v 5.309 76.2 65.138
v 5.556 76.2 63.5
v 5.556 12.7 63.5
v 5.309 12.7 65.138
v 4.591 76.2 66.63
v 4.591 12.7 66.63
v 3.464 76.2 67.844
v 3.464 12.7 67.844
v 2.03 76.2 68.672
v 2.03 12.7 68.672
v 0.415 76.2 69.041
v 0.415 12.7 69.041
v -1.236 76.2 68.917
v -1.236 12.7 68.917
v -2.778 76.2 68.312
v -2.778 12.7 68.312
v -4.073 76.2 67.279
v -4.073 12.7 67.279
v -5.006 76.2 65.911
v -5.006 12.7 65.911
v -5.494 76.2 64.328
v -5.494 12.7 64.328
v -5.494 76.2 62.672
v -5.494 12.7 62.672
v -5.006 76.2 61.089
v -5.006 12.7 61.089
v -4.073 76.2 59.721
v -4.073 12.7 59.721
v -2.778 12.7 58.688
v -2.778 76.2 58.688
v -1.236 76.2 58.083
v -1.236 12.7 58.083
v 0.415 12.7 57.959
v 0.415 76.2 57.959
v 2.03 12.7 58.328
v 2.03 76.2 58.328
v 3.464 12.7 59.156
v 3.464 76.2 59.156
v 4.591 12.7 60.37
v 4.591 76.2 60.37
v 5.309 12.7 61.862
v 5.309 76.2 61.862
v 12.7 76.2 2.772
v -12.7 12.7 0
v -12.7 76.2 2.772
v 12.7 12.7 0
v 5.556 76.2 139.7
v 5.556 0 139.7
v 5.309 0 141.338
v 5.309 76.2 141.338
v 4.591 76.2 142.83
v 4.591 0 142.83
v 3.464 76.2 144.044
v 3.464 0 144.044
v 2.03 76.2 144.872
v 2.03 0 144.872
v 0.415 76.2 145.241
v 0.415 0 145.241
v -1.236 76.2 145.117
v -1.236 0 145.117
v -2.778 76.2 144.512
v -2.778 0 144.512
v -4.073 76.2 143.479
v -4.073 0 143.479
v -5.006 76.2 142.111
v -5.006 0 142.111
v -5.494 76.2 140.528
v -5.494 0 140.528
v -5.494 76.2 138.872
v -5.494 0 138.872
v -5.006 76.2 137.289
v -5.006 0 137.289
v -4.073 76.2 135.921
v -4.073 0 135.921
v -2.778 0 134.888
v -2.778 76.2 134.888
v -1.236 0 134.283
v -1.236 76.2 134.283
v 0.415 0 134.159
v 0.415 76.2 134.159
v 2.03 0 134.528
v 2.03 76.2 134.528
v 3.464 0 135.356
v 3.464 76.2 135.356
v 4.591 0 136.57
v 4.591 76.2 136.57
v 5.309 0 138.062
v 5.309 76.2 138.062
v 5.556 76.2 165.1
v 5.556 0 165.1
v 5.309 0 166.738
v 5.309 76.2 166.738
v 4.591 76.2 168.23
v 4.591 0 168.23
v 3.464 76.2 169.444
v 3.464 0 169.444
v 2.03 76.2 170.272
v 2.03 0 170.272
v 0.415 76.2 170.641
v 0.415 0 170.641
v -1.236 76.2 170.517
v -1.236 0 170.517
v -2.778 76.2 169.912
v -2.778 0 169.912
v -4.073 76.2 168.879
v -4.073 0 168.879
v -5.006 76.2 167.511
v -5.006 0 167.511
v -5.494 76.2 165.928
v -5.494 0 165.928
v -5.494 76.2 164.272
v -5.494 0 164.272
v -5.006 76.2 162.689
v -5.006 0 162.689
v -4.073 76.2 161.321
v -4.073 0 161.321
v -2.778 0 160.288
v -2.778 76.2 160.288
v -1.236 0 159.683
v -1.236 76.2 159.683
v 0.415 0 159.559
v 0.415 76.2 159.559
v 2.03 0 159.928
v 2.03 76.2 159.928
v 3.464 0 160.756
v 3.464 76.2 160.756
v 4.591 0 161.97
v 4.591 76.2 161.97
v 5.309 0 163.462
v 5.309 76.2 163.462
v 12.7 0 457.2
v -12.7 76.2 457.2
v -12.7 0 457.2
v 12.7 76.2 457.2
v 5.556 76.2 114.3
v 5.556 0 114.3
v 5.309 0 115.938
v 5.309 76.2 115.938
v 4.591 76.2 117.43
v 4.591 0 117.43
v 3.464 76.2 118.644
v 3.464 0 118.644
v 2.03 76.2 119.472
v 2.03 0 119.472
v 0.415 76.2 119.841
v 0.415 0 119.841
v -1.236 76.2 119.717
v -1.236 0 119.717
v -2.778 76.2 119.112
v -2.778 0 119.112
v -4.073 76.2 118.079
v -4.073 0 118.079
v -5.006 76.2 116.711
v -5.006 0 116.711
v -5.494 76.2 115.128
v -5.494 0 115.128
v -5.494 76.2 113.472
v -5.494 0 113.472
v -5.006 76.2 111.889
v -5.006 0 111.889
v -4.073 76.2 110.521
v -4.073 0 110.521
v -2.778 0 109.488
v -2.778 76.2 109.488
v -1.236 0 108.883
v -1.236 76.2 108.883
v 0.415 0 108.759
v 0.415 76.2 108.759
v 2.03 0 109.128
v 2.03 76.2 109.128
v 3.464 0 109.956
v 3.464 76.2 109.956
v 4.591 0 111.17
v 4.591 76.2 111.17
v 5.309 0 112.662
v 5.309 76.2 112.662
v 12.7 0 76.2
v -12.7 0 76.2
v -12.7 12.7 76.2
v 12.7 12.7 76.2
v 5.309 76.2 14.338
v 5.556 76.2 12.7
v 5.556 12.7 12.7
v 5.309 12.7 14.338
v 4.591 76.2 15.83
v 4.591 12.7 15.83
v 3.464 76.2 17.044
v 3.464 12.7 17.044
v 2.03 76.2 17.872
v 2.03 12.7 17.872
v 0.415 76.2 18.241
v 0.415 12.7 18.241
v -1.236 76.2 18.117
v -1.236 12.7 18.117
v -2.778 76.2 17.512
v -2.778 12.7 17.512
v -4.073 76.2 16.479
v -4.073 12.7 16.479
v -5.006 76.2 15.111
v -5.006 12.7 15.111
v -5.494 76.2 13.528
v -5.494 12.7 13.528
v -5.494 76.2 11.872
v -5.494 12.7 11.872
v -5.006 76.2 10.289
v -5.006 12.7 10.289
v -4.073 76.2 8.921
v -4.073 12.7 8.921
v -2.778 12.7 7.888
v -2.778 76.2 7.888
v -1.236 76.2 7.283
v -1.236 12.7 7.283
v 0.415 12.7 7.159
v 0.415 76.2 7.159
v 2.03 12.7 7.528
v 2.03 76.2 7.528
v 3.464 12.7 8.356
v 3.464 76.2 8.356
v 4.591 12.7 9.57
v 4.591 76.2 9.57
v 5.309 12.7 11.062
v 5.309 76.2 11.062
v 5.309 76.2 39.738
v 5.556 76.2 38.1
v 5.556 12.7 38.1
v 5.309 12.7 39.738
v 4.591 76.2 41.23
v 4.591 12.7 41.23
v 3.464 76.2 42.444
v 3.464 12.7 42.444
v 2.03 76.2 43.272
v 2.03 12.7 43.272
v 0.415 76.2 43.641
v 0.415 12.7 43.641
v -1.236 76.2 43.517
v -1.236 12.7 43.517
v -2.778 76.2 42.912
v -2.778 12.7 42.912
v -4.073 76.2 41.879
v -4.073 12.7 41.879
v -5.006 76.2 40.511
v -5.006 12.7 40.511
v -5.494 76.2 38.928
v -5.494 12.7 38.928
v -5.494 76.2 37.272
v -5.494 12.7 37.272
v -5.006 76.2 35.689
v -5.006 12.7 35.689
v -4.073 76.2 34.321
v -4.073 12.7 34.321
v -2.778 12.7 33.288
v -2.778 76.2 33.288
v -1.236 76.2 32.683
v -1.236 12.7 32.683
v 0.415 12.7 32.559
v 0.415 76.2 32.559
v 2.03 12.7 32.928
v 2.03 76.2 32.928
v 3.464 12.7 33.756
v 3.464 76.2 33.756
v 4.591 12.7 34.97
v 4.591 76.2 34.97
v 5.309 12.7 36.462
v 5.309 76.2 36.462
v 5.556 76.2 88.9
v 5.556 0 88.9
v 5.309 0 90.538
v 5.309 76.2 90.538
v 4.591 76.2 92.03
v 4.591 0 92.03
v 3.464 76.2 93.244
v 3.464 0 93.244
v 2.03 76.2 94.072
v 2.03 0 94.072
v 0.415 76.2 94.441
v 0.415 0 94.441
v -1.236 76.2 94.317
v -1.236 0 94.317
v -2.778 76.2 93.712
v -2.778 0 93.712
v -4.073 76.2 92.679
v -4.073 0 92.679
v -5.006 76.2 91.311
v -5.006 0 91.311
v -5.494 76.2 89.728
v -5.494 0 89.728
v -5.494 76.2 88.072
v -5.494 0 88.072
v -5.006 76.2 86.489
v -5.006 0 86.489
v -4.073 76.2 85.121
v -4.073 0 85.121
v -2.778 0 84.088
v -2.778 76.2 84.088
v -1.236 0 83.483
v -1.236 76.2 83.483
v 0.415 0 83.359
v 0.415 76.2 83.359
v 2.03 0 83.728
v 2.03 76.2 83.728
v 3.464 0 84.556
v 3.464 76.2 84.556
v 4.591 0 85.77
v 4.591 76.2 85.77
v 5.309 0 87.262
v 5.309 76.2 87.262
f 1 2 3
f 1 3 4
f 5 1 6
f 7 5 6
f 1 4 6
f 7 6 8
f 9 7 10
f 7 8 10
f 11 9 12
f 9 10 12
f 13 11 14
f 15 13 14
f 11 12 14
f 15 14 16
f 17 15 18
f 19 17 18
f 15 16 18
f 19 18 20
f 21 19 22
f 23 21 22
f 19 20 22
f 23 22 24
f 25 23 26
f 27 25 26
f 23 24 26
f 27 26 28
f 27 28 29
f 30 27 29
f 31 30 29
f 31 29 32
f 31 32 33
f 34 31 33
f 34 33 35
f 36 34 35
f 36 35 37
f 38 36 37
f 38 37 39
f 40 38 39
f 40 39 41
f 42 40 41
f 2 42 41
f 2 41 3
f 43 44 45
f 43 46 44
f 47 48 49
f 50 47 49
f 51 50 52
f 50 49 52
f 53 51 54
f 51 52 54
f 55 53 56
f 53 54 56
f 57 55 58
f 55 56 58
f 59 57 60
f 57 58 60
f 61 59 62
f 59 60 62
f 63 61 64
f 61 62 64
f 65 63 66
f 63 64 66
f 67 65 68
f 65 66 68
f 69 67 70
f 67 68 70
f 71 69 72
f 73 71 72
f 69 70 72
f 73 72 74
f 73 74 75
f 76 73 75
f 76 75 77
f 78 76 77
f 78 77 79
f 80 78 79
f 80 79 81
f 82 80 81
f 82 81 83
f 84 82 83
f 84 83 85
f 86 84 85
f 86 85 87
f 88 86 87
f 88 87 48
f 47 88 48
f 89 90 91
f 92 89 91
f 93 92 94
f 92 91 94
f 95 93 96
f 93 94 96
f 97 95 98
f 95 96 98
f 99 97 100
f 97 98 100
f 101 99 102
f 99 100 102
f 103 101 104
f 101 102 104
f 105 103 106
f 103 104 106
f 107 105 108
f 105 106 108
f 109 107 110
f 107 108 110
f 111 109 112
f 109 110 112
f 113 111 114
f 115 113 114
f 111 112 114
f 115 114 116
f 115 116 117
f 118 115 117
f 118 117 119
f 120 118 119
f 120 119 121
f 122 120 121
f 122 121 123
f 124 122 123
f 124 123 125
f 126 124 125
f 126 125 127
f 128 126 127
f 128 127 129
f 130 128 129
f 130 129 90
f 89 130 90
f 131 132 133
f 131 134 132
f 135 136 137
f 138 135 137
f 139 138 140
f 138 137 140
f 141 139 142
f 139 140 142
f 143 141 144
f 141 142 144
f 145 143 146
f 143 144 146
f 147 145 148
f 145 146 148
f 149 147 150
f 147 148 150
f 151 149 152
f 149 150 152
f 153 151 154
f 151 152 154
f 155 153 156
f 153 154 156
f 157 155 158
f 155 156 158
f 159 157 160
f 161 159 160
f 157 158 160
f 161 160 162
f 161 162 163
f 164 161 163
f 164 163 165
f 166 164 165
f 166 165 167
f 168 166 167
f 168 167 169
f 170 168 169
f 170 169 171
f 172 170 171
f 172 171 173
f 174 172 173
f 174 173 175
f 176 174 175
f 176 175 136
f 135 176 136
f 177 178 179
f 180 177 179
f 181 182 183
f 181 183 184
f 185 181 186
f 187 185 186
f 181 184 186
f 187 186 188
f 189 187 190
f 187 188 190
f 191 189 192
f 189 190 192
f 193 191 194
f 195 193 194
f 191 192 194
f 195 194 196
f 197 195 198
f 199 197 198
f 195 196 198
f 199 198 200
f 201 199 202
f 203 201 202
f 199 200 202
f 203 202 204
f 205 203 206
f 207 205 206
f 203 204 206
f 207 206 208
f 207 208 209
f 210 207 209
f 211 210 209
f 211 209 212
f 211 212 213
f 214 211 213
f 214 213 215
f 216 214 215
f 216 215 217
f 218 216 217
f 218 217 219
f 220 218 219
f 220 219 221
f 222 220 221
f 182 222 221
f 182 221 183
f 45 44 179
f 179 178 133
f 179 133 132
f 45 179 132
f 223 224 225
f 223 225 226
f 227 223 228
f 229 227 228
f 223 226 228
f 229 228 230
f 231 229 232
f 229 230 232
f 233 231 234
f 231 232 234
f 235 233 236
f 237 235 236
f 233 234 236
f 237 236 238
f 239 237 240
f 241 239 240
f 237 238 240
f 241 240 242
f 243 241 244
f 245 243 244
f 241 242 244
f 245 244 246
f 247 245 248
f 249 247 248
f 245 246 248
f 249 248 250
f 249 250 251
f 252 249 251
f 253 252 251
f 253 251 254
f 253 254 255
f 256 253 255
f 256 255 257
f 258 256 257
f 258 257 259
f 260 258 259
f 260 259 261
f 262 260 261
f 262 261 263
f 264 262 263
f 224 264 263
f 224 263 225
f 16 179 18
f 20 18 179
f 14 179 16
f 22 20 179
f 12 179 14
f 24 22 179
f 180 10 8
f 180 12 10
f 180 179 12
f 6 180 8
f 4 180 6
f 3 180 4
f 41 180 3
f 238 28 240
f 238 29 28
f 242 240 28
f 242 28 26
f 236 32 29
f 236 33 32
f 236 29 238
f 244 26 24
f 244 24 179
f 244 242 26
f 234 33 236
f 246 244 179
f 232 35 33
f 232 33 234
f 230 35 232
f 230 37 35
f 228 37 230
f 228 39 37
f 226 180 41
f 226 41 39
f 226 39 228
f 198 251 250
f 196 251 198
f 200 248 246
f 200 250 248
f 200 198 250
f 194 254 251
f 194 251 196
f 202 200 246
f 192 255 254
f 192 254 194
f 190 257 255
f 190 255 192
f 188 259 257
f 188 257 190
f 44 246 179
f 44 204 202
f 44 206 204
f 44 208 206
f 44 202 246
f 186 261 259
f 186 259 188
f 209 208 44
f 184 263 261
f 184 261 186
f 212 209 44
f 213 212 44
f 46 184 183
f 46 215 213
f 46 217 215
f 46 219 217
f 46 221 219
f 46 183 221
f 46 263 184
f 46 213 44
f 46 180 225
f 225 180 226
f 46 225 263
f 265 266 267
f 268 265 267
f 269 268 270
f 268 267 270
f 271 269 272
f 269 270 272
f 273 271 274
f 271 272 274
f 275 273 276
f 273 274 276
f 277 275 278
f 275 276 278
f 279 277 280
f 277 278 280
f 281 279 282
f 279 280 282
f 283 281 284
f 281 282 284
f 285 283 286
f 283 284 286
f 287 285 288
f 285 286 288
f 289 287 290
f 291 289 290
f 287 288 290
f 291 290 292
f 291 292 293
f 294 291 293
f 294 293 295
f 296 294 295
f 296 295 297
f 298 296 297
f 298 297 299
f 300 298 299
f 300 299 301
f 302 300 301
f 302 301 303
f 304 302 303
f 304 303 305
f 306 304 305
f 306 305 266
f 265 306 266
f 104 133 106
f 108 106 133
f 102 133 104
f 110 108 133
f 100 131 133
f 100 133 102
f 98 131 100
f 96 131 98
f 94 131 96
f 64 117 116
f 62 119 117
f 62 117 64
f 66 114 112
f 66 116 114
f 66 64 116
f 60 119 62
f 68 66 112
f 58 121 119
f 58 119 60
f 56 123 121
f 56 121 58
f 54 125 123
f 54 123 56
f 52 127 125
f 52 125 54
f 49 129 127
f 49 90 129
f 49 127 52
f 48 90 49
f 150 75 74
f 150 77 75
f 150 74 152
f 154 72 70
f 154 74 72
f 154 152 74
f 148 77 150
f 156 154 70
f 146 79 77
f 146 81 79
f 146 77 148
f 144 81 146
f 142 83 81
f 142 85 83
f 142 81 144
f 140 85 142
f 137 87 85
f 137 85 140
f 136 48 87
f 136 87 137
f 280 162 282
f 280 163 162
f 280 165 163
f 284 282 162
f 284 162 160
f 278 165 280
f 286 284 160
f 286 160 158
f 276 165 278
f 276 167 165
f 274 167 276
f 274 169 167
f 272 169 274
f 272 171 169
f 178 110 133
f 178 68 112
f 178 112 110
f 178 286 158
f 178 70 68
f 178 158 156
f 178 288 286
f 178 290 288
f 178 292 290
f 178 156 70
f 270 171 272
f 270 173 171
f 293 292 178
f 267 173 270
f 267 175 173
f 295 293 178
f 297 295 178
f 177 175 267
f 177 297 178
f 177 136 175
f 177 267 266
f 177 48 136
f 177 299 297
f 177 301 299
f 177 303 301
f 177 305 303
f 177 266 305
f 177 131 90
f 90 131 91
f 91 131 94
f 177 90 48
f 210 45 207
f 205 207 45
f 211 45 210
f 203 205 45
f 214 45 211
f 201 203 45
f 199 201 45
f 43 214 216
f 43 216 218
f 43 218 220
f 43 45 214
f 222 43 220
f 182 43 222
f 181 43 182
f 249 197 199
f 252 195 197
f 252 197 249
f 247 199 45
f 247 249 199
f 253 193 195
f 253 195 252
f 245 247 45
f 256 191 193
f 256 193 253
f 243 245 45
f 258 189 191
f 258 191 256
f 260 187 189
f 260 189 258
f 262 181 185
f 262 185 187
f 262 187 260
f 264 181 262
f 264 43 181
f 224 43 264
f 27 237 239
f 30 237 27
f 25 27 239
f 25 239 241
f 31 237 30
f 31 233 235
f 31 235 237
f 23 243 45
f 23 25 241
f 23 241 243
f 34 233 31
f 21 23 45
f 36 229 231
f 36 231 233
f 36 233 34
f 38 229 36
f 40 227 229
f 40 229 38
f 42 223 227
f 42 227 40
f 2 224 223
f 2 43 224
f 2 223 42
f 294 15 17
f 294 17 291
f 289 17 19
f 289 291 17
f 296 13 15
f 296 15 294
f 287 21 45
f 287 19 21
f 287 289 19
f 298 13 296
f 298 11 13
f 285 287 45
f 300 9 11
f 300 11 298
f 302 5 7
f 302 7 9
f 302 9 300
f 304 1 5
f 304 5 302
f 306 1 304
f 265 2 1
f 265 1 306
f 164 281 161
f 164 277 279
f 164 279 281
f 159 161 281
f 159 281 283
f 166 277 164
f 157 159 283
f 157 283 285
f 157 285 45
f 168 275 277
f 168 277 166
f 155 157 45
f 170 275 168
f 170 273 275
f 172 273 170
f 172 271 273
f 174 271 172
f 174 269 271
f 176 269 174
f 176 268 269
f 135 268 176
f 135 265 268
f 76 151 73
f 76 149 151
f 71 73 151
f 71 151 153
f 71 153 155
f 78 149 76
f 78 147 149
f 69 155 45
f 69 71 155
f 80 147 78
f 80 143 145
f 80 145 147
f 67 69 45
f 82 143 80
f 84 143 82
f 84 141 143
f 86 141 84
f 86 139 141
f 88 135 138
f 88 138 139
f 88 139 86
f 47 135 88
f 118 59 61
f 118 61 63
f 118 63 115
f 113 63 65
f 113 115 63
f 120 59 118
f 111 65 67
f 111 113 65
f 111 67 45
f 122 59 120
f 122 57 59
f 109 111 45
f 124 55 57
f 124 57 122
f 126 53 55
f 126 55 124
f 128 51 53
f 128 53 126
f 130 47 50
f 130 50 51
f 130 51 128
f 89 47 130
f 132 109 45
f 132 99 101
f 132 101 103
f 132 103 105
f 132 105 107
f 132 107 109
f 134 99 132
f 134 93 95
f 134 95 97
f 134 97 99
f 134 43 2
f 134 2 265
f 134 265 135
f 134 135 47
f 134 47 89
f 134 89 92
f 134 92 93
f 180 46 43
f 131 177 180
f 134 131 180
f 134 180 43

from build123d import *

# Parameters (mm, degrees)
F1_DEPTH = 12.7
F2_R     = 5.55625
F3_DEPTH = 63.501
F4_R     = 5.55625
F5_DEPTH = 76.201


with BuildPart() as f1:
    # F0 (on Right) → F1 (new body, symmetric)
    with BuildSketch(Plane.YZ):
        Polygon((76.2, 457.2), (0, 457.2), (0, 76.2), (12.7, 76.2), (12.7, 0), (76.2, 2.77247), align=None)
    extrude(amount=F1_DEPTH, both=True)

    # F2 (on face) → F3 (cut, through all)
    with BuildSketch(Plane.XZ.offset(-12.7)):
        with Locations((0, 38.1)):
            Circle(F2_R)
        with Locations((0, 63.5)):
            Circle(F2_R)
        with Locations((0, 12.7)):
            Circle(F2_R)
    extrude(amount=-F3_DEPTH, mode=Mode.SUBTRACT)

    # F4 (on face) → F5 (cut, through all)
    with BuildSketch(Plane.XZ):
        with Locations((0, 114.3)):
            Circle(F4_R)
        with Locations((0, 139.7)):
            Circle(F4_R)
        with Locations((0, 88.9)):
            Circle(F4_R)
        with Locations((0, 165.1)):
            Circle(F4_R)
    extrude(amount=-F5_DEPTH, mode=Mode.SUBTRACT)


solid = f1.part
